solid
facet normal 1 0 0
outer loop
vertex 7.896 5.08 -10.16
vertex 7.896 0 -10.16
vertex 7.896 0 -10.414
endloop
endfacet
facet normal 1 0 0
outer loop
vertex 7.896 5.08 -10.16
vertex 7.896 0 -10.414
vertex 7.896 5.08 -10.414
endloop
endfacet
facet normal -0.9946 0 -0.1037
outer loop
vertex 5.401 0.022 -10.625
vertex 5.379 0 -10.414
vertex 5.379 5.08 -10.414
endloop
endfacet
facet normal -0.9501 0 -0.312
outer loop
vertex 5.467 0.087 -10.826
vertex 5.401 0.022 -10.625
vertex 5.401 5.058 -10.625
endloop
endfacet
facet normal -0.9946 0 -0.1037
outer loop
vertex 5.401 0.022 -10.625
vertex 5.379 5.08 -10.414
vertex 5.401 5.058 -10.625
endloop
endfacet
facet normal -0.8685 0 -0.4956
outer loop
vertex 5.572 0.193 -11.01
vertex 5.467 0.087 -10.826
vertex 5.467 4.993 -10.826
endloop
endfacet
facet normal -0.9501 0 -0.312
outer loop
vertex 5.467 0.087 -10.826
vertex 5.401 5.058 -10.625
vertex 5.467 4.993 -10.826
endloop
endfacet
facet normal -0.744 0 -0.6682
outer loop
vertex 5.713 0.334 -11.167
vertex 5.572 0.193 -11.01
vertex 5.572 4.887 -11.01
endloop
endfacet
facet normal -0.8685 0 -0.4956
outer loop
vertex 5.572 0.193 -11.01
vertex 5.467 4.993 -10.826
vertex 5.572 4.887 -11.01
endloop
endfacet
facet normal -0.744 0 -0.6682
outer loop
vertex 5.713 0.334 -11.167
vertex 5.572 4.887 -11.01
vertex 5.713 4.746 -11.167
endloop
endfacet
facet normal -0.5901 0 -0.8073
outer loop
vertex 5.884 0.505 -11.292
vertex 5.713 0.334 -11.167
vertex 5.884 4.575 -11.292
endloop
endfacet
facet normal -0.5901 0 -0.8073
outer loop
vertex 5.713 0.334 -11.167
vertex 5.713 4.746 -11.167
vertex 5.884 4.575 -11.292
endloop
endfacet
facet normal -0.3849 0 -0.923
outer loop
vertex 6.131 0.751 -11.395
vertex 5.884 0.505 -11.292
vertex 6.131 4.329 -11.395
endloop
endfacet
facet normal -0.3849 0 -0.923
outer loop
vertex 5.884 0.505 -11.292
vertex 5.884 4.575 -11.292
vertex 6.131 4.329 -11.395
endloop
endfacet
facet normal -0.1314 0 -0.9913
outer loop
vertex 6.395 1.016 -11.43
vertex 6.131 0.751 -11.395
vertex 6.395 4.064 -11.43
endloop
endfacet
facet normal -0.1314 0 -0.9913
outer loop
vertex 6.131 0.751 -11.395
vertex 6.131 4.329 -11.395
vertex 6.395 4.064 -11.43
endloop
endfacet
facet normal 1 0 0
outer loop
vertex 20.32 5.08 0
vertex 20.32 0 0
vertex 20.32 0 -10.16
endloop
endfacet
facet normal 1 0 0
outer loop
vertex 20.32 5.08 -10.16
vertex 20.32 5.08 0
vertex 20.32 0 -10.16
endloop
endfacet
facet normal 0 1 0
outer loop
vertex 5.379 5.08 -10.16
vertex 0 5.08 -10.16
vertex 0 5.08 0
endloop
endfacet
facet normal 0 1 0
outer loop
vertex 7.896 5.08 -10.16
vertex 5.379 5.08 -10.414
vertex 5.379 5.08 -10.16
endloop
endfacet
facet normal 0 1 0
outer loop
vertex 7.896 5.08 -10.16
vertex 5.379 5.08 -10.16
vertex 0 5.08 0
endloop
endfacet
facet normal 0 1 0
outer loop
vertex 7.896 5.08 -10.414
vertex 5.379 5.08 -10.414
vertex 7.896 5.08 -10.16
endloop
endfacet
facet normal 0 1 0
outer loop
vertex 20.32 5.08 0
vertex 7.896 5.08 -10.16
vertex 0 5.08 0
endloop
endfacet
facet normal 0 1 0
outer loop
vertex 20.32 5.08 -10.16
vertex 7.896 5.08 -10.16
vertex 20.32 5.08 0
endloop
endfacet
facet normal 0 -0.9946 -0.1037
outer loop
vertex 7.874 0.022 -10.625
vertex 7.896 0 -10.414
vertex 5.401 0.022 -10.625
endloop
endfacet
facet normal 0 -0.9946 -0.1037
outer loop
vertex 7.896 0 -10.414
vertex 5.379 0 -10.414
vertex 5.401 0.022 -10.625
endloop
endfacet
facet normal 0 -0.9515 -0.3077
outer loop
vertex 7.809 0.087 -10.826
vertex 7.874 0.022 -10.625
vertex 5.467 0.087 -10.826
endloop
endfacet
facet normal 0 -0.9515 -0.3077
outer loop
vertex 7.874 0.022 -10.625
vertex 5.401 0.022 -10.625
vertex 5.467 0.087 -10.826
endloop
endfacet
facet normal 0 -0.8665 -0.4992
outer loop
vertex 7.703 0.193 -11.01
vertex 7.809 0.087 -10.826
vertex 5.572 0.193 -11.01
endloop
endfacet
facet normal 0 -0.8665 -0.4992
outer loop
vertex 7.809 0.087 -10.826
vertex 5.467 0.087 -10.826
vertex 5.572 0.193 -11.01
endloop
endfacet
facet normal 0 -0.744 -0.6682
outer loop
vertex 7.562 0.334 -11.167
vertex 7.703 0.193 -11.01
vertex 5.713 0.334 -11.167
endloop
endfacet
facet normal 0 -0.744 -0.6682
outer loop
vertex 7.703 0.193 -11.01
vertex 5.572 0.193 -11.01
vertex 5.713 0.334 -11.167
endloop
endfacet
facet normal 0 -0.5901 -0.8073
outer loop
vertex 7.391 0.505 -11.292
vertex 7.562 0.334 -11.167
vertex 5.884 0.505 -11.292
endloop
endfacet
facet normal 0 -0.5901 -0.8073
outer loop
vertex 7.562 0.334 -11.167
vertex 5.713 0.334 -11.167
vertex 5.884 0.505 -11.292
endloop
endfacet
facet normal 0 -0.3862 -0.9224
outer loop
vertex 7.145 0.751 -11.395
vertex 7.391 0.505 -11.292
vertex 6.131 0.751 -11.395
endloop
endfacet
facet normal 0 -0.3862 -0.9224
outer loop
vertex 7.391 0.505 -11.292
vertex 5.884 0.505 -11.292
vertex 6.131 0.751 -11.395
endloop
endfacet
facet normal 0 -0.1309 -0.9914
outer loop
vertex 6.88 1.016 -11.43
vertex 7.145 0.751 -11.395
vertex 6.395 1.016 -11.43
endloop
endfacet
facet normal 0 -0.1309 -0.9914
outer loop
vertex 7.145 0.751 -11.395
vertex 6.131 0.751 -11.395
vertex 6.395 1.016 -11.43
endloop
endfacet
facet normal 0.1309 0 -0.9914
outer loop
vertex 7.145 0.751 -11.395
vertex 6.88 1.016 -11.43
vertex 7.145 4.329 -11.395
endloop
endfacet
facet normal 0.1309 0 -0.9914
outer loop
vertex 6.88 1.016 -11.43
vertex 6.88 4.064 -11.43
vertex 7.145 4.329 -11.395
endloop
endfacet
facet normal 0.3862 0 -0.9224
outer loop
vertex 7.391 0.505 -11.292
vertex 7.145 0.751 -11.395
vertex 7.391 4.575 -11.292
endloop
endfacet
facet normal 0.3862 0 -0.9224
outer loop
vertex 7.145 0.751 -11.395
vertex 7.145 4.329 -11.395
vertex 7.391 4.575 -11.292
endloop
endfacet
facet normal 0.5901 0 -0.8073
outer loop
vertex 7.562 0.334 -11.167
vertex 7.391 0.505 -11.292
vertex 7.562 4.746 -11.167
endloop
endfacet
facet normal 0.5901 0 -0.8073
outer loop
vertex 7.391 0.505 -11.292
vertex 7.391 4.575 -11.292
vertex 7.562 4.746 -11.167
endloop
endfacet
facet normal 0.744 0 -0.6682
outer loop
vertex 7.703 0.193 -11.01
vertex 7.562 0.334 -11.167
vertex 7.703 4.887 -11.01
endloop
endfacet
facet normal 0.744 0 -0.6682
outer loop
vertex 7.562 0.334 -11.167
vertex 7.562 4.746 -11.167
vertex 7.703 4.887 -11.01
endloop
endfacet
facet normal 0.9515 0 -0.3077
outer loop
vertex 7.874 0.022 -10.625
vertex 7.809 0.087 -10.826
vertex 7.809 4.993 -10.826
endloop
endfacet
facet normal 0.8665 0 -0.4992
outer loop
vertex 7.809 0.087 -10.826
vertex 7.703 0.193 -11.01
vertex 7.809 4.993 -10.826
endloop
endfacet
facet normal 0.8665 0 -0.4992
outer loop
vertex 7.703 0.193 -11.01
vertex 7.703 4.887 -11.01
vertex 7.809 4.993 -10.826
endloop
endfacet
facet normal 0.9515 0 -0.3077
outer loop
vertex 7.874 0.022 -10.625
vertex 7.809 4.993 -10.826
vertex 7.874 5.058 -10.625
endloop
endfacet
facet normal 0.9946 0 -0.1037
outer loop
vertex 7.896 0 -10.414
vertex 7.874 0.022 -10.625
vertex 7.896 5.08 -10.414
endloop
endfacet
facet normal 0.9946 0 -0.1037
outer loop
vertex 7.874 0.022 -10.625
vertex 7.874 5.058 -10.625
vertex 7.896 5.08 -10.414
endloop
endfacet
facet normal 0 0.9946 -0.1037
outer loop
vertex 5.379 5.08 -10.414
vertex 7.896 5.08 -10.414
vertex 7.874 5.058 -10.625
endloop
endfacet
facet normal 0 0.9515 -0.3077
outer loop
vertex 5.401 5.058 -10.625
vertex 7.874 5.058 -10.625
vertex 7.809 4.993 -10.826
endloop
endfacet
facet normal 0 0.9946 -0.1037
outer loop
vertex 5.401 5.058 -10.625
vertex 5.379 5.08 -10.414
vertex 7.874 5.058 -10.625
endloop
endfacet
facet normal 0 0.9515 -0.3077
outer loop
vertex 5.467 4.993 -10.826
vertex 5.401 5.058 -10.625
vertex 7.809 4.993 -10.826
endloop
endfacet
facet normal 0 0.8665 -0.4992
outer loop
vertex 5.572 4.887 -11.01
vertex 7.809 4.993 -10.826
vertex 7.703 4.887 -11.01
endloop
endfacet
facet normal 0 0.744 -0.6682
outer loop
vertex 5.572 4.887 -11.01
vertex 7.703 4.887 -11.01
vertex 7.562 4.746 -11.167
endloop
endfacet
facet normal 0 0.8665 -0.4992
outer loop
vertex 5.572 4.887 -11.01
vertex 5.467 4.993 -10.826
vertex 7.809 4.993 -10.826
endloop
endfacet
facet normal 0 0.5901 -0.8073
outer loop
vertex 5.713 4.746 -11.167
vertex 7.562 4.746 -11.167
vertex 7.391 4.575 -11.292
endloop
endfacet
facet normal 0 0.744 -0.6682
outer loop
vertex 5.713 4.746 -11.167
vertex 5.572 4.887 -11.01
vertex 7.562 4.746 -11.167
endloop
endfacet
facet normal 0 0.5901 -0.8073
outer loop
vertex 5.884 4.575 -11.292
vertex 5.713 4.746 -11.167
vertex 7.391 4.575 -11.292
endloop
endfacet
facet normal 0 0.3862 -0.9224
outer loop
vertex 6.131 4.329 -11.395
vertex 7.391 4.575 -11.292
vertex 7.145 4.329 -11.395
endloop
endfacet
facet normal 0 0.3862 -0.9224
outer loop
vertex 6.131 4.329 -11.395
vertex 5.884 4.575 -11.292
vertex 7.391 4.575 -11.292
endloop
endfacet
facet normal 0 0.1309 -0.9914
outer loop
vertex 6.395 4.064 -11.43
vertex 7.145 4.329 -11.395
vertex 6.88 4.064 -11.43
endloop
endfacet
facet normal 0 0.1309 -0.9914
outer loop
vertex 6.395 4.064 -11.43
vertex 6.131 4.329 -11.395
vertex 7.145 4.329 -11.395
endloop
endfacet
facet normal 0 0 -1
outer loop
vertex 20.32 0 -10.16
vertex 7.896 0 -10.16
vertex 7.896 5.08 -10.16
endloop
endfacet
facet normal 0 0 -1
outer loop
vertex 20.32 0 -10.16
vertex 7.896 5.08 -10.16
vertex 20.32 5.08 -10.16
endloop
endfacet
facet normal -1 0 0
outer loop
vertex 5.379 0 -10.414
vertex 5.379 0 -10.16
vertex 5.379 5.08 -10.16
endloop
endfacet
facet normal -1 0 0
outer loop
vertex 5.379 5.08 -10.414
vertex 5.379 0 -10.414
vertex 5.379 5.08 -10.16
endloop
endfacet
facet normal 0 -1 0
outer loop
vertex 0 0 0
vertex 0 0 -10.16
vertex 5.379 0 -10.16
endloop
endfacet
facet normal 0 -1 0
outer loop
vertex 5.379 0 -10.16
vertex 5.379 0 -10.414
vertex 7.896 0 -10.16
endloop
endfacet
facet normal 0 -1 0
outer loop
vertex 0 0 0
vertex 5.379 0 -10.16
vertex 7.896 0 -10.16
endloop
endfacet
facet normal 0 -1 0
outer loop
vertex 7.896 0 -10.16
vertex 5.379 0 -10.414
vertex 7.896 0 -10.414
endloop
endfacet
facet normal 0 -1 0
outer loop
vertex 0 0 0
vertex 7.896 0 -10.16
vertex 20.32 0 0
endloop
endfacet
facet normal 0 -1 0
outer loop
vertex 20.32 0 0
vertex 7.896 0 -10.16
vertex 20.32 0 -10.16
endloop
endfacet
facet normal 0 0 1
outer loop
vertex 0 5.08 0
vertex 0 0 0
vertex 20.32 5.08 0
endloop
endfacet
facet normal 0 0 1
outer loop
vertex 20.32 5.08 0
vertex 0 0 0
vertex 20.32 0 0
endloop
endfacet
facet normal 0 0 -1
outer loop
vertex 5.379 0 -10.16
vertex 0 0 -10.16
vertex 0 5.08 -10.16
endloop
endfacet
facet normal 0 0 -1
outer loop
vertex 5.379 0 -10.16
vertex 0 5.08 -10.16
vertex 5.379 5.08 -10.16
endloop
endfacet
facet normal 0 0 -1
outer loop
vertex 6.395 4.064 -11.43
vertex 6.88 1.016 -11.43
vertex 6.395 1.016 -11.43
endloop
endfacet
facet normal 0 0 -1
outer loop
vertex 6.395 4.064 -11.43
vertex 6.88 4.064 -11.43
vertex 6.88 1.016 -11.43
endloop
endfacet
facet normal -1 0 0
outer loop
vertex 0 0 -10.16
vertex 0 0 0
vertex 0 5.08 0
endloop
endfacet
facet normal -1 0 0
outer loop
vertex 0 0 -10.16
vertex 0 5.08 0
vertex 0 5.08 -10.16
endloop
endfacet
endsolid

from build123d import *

# Parameters (mm, degrees)
SKETCH1_W           = 20.32
SKETCH1_H           = 10.16
BOSS_EXTRUDE1_DEPTH = 5.08
SKETCH3_W           = 2.516713444
SKETCH3_H           = 5.08
BOSS_EXTRUDE2_DEPTH = 1.27
FILLET1_R           = 1.016


with BuildPart() as part:
    # Sketch1 → Boss-Extrude1 (new body)
    with BuildSketch(Plane(origin=(0, 0, 0), x_dir=(1, 0, 0), z_dir=(0, 1, 0))):
        with Locations((10.16, 5.08)):
            Rectangle(SKETCH1_W, SKETCH1_H)
    extrude(amount=BOSS_EXTRUDE1_DEPTH)

    # Sketch3 → Boss-Extrude2 (add)
    with BuildSketch(Plane(origin=(0, 0, -10.16), x_dir=(-1, 0, 0), z_dir=(0, 0, -1))):
        with Locations((-6.637688848, 2.54)):
            Rectangle(SKETCH3_W, SKETCH3_H)
    extrude(amount=BOSS_EXTRUDE2_DEPTH)

    # Fillet1
    fillet1_edges = [part.edges().sort_by_distance(p)[0] for p in [
        (6.637688848, 0, -11.43),
        (5.379332126, 2.54, -11.43),
        (6.637688848, 5.08, -11.43),
        (7.89604557, 2.54, -11.43),
    ]]
    fillet(fillet1_edges, radius=FILLET1_R)


solid = part.part
